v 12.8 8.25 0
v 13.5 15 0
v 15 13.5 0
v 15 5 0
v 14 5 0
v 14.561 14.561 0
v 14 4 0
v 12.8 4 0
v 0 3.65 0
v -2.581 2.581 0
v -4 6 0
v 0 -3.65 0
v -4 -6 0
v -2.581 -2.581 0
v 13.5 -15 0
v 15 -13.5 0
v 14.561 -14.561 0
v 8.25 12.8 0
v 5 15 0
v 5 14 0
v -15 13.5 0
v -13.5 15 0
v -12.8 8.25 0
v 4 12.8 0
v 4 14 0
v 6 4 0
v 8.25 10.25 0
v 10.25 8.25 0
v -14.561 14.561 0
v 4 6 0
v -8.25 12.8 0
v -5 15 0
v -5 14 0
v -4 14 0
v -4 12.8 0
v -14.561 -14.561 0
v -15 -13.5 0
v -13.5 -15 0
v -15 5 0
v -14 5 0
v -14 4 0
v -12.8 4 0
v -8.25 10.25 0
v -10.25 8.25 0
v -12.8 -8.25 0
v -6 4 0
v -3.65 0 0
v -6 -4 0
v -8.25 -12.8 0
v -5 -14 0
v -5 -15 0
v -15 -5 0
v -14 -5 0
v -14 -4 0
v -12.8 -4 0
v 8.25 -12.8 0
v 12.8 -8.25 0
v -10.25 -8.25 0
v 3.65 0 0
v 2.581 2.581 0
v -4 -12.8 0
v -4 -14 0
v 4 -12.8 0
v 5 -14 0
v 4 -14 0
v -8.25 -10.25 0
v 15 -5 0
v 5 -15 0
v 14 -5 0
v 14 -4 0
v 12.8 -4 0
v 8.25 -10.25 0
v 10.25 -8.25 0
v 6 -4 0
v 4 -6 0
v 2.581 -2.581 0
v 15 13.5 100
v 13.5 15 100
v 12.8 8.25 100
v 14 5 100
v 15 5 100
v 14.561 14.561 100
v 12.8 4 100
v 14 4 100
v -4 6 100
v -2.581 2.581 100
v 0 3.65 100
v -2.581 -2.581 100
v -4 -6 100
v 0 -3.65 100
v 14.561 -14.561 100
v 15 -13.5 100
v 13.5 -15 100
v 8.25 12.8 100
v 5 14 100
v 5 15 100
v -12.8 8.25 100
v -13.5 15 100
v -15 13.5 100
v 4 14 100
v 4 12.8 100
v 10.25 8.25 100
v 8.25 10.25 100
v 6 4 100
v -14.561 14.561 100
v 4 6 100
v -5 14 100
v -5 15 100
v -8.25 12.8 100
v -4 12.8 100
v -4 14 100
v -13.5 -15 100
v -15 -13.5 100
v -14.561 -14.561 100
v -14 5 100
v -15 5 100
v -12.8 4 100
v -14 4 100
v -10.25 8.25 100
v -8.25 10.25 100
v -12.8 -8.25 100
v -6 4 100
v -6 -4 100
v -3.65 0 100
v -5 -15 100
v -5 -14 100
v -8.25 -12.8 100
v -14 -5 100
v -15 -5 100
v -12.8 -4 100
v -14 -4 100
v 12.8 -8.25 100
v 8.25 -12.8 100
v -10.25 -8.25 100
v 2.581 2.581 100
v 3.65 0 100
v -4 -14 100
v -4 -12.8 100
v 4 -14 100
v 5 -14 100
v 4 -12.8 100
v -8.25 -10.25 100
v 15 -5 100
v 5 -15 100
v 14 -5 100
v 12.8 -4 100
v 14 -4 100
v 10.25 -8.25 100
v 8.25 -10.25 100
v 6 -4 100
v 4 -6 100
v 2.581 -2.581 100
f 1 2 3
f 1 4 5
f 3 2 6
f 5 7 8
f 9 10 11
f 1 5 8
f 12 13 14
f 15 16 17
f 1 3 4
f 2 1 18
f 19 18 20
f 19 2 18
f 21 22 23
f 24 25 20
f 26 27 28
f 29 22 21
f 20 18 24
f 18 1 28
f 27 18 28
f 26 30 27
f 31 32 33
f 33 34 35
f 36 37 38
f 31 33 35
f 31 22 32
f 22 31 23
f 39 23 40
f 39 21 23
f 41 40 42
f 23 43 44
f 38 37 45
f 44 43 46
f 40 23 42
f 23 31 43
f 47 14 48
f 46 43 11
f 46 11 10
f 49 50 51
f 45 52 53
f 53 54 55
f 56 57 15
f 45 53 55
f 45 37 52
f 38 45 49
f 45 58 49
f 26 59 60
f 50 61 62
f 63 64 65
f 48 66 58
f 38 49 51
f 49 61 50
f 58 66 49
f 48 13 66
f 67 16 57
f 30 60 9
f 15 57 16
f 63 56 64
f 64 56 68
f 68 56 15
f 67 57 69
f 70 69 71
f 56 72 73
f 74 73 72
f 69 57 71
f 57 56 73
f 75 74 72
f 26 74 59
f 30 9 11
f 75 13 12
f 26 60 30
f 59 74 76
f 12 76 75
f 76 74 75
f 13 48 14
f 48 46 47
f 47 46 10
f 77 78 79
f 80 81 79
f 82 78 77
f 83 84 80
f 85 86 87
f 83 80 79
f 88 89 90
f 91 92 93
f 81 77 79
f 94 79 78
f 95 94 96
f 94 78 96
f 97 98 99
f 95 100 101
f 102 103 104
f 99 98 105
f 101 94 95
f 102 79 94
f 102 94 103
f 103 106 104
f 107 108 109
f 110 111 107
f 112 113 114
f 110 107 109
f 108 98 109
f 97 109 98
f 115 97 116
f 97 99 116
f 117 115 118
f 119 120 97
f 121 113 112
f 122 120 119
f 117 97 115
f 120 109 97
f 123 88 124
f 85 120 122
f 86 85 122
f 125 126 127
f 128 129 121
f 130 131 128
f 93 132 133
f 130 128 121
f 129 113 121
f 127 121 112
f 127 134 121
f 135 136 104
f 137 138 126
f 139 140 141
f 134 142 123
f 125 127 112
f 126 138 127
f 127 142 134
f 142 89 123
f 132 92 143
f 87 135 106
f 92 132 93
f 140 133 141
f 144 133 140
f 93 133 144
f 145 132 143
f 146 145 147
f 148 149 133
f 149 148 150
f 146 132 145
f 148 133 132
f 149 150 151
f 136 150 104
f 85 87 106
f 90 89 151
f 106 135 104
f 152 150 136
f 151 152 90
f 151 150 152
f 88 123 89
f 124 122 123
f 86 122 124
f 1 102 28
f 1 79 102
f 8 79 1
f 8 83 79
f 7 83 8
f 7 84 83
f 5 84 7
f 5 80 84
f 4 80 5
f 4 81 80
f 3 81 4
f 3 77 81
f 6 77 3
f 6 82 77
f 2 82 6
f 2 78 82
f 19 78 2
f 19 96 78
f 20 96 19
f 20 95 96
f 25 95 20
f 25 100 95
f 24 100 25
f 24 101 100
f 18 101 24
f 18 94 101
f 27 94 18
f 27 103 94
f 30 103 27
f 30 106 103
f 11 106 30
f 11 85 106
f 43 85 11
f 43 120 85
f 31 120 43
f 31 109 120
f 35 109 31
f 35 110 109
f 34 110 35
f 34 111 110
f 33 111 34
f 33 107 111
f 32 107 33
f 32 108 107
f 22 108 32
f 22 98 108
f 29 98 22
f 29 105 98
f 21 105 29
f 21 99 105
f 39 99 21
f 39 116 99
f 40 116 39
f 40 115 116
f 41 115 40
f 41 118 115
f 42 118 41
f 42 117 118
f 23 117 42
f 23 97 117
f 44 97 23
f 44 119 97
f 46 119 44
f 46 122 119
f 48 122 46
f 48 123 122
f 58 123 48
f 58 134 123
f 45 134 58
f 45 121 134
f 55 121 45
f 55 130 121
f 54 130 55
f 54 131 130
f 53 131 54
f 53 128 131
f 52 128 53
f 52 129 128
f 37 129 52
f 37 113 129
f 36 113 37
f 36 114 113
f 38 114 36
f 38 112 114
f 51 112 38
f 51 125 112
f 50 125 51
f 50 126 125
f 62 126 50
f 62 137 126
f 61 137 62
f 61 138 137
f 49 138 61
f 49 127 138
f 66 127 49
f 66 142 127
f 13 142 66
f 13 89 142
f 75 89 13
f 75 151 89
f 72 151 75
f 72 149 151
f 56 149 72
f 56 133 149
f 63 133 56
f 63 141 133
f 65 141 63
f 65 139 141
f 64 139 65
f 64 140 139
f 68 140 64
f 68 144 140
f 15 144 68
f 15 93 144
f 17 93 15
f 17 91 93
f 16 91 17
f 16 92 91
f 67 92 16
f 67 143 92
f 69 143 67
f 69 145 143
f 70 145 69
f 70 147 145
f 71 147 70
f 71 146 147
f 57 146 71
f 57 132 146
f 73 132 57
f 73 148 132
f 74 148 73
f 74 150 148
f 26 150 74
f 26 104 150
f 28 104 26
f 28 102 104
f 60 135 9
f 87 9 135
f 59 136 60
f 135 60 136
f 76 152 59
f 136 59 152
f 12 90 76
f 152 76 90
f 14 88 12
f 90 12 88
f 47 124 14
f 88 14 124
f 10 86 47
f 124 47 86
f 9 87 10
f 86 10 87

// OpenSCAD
// Aleksandr Saechnikov 09 june 2015

extrusion_profile(height=100, size=30);

module extrusion_profile(size=30, height=10, radius=1.5, step=1) {

	linear_extrude(height=height) {
		union() {
			sub_extrusion_profile(size, radius, step);
			rotate([0,0,90])  sub_extrusion_profile(size, radius, step);
			rotate([0,0,180]) sub_extrusion_profile(size, radius, step);
			rotate([0,0,270]) sub_extrusion_profile(size, radius, step);
		}
	}
}

module sub_extrusion_profile(size=30, radius = 1.5, step=0.5) {

	reSize = size/30; // Scalling

	k0 = 0;
	k2 = 3.65*reSize;
	k1 = k2*cos(45);

	k3 = 4*reSize;
	k4 = 6*reSize;
	k5 = 8.25*reSize; k5_2 = k5 + k4 - k3;
	k6 = 12.8*reSize;
	k7 = 15*reSize;

	_radius = radius;// OR  *reSize -- Corner radius
	_step = step;    // OR  *reSize -- Step size

	polygon(points=[
		[k1,k1],[0,k2], // Center hole
		[0,k4],[k3,k4],[k5,k5_2],[k5,k6],[k3,k6],
		[k3,k7-_step],[k3+_step,k7-_step],[k3+_step,k7], //Step
		[k7-_radius,k7],[k7-_radius*(1.-cos(45)),k7-_radius*(1.-cos(45))],[k7,k7-_radius],// Corner
		[k7,k3+_step],[k7-_step,k3+_step],[k7-_step,k3], // Step
		[k6,k3],[k6,k5],[k5_2,k5],[k4,k3],[k4,0],
		[k2,0]  // Center hole
	]);
}
